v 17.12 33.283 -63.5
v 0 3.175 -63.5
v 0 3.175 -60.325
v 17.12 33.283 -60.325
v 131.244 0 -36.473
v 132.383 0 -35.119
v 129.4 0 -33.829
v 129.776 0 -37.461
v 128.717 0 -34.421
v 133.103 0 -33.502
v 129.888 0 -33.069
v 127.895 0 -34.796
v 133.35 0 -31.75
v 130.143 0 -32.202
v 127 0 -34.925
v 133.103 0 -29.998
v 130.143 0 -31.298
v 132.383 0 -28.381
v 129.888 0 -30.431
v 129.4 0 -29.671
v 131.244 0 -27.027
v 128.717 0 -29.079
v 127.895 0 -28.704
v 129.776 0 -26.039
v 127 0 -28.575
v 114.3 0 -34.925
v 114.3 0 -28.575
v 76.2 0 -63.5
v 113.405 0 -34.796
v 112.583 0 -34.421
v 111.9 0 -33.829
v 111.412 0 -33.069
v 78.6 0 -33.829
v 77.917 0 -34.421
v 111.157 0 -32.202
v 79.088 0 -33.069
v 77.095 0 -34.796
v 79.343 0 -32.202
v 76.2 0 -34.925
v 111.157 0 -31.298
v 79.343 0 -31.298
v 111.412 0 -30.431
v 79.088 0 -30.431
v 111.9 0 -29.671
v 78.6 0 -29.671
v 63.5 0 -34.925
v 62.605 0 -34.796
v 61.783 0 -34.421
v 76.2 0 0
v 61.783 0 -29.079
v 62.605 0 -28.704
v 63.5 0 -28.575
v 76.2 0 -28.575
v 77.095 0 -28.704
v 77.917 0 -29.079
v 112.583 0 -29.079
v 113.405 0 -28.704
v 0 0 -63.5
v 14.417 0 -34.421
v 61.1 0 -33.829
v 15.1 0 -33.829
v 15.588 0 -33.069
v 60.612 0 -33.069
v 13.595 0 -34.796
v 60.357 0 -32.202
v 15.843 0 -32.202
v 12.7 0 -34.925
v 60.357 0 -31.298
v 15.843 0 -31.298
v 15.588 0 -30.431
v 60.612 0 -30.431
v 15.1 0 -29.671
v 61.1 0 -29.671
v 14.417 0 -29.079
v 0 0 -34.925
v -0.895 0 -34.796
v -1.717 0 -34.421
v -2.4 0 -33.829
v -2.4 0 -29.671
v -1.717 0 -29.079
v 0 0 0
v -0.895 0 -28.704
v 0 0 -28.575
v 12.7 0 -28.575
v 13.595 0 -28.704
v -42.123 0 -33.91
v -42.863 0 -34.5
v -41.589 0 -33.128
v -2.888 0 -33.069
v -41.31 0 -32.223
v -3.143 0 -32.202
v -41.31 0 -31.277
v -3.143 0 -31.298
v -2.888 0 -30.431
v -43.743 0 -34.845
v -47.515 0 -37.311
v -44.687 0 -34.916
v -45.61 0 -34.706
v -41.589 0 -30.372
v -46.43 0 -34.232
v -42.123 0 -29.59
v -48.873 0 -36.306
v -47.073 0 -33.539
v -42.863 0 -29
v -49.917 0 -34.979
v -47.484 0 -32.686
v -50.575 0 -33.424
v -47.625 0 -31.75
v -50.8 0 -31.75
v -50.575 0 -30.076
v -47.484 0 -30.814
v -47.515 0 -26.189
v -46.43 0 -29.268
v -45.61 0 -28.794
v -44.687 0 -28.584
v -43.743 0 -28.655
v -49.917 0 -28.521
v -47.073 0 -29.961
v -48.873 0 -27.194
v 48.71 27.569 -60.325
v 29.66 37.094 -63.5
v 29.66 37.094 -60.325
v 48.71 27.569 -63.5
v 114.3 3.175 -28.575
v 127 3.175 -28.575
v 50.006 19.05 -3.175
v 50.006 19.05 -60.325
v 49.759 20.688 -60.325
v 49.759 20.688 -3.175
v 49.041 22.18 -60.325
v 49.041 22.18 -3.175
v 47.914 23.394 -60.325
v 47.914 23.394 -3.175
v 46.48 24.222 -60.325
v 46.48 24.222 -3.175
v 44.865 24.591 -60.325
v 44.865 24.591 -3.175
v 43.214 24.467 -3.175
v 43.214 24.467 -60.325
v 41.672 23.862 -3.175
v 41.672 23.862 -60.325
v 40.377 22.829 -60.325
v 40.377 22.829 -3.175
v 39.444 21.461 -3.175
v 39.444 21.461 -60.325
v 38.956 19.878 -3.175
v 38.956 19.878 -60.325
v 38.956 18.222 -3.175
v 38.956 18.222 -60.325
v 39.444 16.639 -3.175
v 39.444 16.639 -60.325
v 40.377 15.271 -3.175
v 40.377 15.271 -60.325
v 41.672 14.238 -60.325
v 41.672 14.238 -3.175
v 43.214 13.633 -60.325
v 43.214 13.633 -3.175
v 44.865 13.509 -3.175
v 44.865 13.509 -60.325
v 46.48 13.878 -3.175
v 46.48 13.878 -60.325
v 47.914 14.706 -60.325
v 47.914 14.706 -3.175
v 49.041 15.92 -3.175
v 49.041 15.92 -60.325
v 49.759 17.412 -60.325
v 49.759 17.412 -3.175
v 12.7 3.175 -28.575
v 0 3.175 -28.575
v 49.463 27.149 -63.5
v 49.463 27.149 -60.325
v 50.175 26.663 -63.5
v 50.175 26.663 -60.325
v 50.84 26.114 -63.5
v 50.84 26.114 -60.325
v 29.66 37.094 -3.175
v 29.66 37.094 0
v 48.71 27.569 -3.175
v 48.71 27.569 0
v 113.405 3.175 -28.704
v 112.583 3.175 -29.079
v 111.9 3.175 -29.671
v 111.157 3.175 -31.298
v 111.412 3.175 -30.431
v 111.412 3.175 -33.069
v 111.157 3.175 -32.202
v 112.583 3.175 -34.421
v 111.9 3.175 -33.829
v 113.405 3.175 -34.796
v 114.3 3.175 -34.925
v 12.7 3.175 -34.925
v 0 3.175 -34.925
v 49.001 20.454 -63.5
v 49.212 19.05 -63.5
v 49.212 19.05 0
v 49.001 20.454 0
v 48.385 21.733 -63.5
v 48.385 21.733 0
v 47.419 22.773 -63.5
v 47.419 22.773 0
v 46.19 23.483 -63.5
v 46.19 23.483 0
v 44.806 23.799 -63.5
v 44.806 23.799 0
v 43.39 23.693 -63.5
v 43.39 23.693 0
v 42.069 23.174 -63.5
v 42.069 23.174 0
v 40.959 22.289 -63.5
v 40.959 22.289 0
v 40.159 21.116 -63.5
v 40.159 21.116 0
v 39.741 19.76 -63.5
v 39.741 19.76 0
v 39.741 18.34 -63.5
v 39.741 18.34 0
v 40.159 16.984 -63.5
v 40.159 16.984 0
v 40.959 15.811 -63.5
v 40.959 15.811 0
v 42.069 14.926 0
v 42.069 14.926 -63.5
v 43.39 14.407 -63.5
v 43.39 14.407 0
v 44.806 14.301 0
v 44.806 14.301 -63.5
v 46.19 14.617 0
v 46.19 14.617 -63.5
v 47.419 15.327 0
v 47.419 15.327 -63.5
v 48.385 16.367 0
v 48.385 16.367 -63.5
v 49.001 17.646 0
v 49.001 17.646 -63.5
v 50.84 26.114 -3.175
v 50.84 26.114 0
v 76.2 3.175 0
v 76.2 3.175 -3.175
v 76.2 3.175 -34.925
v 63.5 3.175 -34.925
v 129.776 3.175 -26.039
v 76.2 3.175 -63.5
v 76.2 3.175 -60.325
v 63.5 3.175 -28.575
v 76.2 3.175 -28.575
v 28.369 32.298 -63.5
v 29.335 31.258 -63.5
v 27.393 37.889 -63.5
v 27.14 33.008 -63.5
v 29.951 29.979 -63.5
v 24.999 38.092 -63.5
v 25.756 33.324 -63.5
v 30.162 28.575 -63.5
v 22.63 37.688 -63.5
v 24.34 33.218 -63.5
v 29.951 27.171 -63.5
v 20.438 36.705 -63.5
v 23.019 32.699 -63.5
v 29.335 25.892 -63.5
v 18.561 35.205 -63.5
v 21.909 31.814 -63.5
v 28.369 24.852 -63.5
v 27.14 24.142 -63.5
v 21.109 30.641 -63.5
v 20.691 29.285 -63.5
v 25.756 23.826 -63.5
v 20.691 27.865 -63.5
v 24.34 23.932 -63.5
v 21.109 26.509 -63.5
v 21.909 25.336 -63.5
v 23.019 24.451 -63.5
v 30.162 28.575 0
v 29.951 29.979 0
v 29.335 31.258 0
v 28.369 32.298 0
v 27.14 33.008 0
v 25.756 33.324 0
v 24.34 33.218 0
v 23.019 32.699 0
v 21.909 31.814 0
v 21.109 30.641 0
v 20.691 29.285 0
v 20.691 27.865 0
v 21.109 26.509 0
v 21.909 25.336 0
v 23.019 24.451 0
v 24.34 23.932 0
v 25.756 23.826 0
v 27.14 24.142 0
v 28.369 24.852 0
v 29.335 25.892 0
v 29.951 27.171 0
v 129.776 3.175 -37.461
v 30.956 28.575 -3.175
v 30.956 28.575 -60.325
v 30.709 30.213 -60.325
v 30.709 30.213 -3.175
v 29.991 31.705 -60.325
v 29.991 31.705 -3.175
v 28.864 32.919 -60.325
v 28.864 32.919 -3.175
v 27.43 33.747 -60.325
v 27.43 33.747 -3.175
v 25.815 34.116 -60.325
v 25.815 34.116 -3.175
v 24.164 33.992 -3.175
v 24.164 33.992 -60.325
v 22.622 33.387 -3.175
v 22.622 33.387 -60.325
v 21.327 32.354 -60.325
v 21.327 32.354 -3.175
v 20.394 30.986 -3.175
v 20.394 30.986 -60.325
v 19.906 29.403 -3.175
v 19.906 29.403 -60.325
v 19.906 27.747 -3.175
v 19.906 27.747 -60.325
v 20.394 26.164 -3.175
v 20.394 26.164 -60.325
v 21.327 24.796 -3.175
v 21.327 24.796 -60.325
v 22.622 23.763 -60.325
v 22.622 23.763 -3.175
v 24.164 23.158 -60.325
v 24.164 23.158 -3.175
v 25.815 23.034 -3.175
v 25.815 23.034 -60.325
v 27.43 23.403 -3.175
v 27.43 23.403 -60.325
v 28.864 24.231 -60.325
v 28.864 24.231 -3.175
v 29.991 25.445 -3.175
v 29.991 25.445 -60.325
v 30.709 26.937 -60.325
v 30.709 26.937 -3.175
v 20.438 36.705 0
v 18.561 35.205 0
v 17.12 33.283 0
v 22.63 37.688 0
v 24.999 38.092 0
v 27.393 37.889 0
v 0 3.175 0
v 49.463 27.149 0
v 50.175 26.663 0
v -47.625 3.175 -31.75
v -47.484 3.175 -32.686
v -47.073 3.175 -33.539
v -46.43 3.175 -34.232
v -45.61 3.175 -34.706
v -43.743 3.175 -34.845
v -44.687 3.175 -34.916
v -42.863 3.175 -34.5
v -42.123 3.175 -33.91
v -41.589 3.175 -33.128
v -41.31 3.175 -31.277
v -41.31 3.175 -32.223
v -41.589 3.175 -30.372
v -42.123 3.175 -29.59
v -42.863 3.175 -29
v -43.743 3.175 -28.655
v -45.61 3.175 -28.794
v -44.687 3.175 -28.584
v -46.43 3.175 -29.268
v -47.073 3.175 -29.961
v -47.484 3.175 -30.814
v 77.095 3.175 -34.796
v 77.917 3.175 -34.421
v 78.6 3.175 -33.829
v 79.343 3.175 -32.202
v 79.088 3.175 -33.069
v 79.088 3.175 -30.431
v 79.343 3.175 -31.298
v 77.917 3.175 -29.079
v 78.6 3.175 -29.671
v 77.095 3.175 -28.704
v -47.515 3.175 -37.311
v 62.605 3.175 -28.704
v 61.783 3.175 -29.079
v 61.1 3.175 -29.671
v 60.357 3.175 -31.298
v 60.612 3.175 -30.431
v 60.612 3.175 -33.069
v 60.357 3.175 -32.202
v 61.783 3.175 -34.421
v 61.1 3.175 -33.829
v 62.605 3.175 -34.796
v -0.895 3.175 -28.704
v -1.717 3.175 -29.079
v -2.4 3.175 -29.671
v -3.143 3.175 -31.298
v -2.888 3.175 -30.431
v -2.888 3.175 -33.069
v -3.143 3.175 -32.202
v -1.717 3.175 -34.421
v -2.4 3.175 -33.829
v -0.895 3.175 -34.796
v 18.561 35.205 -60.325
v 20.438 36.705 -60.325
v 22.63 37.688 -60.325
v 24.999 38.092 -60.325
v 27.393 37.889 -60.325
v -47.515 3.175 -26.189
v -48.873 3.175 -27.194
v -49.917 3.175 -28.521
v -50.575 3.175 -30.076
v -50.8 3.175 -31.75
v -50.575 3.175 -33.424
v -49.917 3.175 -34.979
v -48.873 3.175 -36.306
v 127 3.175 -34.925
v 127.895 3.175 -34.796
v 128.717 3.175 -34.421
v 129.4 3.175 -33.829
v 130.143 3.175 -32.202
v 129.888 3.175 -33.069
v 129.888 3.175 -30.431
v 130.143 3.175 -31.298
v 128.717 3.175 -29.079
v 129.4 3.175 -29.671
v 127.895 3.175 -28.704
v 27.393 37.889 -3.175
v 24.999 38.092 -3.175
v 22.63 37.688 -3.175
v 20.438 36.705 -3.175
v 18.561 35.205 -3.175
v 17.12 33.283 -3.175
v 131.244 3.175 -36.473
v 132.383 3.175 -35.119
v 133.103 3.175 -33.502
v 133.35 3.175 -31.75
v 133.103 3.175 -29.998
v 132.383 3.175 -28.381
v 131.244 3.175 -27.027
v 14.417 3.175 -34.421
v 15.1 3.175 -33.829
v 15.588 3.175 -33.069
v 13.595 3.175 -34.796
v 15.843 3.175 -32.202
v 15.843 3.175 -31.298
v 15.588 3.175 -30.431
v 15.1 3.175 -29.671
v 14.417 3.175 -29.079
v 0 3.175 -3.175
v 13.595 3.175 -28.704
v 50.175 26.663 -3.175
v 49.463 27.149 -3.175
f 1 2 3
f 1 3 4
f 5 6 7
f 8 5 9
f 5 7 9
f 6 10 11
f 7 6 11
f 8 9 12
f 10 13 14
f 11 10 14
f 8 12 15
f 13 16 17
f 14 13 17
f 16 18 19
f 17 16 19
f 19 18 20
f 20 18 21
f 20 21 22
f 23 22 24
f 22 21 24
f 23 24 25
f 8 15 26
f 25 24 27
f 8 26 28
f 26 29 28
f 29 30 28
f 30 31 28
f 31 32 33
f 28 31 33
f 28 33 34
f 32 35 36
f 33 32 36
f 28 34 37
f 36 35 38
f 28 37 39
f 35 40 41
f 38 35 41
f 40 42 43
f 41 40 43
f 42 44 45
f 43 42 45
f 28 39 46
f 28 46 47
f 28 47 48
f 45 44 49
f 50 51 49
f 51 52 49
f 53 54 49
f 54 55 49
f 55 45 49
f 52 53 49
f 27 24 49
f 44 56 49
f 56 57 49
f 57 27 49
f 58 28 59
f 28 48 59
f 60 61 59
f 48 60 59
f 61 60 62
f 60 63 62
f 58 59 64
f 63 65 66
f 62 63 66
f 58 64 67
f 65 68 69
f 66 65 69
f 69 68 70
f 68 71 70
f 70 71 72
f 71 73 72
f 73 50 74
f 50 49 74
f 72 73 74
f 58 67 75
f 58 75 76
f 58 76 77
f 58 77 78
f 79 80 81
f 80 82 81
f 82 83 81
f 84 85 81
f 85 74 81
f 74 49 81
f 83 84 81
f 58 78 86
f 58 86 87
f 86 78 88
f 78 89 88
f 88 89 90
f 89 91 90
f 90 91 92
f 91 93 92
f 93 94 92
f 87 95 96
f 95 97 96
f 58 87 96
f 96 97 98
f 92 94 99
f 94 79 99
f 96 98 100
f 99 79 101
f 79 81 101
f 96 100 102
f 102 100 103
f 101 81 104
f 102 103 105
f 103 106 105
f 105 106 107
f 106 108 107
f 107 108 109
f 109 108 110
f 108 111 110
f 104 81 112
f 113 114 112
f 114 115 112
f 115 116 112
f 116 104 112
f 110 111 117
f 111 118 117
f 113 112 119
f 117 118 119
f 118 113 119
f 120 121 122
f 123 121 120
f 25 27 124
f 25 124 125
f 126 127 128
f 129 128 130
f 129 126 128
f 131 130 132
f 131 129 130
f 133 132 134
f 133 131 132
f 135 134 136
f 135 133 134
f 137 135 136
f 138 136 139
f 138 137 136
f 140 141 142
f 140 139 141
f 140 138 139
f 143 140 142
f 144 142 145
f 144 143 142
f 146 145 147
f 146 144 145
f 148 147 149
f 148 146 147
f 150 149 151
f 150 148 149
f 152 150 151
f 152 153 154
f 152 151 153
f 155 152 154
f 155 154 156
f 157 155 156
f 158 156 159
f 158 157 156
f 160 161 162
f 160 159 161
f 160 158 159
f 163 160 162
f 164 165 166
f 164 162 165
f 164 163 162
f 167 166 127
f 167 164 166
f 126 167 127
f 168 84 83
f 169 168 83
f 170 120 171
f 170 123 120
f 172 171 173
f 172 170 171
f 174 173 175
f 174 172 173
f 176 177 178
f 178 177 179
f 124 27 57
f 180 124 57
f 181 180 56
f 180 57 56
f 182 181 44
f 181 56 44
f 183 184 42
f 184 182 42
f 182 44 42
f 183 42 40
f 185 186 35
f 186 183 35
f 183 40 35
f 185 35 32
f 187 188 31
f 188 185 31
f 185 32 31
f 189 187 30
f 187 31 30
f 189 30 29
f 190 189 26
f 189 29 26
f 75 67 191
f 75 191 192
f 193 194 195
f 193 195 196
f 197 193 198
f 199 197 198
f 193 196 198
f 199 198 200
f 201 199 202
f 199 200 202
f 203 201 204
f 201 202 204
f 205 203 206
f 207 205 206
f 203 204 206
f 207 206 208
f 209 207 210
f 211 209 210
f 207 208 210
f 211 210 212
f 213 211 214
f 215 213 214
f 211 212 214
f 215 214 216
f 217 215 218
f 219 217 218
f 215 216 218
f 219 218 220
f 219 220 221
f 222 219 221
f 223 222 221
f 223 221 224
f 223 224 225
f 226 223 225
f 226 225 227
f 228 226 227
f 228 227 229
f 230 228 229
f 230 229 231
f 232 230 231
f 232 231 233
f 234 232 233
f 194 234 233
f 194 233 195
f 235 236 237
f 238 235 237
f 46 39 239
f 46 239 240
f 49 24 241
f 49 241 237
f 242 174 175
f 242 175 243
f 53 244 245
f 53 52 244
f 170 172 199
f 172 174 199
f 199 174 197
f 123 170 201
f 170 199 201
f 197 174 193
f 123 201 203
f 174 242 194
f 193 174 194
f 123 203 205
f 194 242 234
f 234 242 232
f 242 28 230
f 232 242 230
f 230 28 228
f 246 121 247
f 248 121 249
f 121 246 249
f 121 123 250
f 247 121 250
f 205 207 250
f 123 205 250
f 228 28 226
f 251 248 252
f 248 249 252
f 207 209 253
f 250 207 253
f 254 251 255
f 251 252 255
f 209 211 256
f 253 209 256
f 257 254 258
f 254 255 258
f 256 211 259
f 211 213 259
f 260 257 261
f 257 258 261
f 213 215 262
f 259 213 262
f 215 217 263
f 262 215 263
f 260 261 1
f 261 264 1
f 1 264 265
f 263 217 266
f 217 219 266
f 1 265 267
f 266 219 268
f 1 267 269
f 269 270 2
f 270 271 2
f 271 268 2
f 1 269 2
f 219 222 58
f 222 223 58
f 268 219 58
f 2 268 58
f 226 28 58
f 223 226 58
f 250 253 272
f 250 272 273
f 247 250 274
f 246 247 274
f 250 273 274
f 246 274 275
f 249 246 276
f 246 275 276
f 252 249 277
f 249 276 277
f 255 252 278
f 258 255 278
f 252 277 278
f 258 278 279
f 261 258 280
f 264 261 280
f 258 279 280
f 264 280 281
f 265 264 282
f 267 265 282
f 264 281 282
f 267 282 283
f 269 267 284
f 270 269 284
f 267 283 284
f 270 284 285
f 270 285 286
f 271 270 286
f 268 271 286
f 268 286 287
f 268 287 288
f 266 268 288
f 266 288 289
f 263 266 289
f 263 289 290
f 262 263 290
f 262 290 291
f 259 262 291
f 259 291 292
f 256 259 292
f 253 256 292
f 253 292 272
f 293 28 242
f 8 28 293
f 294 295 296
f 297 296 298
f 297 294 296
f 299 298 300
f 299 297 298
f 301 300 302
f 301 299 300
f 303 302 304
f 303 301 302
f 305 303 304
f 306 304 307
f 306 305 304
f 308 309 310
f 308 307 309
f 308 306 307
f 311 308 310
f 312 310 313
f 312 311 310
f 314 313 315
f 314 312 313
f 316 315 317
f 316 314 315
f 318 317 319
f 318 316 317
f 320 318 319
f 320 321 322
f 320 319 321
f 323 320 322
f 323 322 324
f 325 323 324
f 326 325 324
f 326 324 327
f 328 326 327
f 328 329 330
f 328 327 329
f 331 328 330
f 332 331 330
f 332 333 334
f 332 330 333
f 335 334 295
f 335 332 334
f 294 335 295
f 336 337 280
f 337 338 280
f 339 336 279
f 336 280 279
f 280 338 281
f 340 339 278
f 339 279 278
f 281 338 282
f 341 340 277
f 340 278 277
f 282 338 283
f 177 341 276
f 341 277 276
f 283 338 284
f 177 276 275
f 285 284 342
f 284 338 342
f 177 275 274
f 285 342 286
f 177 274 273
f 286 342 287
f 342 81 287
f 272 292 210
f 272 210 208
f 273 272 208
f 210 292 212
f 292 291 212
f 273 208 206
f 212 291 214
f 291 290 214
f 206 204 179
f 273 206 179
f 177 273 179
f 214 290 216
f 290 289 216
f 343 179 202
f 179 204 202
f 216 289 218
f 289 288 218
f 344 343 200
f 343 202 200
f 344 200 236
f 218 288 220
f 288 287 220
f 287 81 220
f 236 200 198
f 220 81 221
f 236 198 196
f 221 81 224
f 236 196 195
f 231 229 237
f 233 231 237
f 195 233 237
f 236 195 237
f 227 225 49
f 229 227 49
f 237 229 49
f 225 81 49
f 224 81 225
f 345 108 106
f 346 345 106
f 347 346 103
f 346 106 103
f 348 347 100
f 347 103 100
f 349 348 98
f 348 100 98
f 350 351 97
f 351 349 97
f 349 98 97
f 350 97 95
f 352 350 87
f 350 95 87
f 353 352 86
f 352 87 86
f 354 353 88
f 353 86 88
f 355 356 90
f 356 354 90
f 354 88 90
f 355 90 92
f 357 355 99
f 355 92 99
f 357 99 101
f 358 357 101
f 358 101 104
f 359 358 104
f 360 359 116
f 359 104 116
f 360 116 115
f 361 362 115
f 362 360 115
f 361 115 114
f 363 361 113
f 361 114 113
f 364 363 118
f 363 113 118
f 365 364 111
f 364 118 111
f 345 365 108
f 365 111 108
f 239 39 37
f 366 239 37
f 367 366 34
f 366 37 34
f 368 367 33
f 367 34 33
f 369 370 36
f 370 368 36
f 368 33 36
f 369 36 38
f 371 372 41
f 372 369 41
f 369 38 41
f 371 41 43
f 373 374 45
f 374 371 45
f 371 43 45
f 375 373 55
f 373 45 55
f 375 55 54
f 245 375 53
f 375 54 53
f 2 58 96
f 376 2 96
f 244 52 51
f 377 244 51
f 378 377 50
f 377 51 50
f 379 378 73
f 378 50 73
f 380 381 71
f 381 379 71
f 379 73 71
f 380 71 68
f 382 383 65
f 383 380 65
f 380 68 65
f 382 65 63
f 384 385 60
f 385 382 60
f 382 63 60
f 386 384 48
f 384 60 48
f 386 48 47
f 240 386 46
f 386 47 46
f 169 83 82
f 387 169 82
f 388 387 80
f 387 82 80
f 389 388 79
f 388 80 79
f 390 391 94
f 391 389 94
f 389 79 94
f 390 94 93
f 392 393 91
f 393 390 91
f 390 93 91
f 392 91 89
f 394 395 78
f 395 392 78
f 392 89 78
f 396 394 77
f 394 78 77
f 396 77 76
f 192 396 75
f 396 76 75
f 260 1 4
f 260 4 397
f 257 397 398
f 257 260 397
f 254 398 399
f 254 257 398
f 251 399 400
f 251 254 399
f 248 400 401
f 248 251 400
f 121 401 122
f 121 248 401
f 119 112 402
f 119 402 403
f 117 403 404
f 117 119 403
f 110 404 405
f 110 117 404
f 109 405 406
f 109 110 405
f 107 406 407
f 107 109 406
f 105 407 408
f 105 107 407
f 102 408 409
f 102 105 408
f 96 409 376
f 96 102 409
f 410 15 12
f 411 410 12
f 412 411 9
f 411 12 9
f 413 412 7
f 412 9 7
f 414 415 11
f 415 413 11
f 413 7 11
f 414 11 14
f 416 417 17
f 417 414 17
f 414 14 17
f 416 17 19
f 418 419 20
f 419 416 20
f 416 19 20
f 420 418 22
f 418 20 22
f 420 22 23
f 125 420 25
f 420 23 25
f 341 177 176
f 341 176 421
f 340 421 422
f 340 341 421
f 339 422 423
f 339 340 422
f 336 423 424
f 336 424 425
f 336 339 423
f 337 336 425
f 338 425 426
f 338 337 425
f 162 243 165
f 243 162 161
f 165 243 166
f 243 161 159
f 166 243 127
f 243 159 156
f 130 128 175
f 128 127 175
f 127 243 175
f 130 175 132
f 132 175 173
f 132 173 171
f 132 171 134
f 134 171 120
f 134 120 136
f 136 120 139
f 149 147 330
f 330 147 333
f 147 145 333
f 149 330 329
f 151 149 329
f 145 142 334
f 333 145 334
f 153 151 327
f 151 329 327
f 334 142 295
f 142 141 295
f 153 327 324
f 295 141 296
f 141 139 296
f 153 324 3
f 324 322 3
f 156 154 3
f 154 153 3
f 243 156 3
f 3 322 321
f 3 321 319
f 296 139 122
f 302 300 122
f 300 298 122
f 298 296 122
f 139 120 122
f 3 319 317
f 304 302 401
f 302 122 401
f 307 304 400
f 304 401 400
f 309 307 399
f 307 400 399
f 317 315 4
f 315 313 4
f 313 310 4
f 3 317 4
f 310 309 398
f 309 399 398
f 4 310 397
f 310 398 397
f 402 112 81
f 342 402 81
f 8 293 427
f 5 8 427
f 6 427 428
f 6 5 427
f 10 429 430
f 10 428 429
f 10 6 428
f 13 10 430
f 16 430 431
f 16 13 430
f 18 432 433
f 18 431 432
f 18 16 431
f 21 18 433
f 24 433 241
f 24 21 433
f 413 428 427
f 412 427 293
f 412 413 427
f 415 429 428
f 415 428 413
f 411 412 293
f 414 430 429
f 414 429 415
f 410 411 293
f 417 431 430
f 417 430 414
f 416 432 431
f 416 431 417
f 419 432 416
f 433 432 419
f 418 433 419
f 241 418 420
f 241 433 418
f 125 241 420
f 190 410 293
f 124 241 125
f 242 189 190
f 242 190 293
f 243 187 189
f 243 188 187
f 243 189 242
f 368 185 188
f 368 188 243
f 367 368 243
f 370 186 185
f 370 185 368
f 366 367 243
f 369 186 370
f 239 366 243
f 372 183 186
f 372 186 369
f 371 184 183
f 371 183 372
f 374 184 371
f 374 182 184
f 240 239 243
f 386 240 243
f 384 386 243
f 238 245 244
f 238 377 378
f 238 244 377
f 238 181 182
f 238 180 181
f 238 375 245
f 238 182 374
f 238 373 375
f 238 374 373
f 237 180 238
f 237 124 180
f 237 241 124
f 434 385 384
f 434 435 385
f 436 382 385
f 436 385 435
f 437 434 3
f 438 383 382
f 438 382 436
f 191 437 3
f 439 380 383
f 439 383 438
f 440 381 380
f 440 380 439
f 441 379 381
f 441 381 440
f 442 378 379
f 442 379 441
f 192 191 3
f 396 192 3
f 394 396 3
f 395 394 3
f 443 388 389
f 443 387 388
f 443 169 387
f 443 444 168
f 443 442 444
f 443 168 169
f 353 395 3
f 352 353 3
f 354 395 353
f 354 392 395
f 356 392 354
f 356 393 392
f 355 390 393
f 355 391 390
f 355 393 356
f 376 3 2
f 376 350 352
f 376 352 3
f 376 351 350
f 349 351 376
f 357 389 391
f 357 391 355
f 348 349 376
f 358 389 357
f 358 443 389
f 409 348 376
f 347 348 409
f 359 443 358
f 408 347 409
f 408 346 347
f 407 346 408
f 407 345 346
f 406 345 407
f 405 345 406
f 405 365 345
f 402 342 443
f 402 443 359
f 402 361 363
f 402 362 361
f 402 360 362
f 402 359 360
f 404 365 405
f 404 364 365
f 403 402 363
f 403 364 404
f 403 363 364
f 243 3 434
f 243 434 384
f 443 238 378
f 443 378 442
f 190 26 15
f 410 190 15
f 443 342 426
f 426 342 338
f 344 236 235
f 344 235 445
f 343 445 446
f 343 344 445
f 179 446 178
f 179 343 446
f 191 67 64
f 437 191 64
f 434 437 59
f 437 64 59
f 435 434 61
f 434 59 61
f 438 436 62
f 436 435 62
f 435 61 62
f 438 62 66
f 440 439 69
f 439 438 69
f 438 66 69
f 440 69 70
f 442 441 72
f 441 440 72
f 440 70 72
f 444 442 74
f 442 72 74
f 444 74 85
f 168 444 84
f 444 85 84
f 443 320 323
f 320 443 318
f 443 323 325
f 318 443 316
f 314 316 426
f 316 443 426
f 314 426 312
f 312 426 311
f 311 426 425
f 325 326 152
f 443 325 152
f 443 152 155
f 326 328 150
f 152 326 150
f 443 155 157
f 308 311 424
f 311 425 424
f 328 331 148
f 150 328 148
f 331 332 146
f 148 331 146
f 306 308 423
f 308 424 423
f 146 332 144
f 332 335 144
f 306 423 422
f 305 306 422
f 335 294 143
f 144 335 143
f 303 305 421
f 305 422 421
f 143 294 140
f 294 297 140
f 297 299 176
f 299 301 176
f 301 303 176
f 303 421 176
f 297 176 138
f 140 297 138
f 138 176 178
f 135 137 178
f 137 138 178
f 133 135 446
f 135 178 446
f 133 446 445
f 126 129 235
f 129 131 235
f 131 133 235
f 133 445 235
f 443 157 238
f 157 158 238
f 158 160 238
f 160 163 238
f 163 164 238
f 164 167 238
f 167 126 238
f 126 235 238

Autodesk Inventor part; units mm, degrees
ref_plane "YZ Plane" through (0, 0, 0) normal (1, 0, 0) x (0, 1, 0)
ref_plane "XZ Plane" through (0, 0, 0) normal (0, 1, 0) x (-1, 0, 0)
ref_plane "XY Plane" through (0, 0, 0) normal (0, 0, 1) x (1, 0, 0)
sketch "Sketch1" plane through (0, 0, 0) normal (0, 1, 0) x (-1, 0, 0)
  line L0 (0, 0) -> (-76.2, 0)
  line L1 (-76.2, 0) -> (-76.2, -63.5) construction
  line L2 (-76.2, -63.5) -> (0, -63.5)
  line L3 (0, -63.5) -> (0, 0) construction
  line L4 (0, -31.75) -> (44.45, -31.75) construction
  line L5 (-76.2, -31.75) -> (-127, -31.75) construction
  circle A0 centre (44.45, -31.75) radius 3.175
  circle A1 centre (-127, -31.75) radius 3.175 construction
  circle A2 centre (-114.3, -31.75) radius 3.175 construction
  line L6 (-114.3, -34.925) -> (-127, -34.925)
  line L7 (-114.3, -28.575) -> (-127, -28.575)
  arc A3 (-114.3, -34.925) -> (-114.3, -28.575) centre (-114.3, -31.75) ccw
  arc A4 (-127, -28.575) -> (-127, -34.925) centre (-127, -31.75) ccw
  line L8 (0, -63.5) -> (47.5152, -37.3112)
  line L9 (47.5152, -26.1888) -> (0, 0)
  line L10 (-76.2, -63.5) -> (-129.7757, -37.4612)
  line L11 (-129.7757, -26.0388) -> (-76.2, 0)
  arc A5 (47.5152, -37.3112) -> (47.5152, -26.1888) centre (44.45, -31.75) ccw
  arc A6 (-129.7757, -26.0388) -> (-129.7757, -37.4612) centre (-127, -31.75) ccw
  circle A7 centre (-76.2, -31.75) radius 3.175 construction
  circle A8 centre (-63.5, -31.75) radius 3.175 construction
  line L12 (-76.2, -28.575) -> (-63.5, -28.575) construction
  line L13 (-76.2, -34.925) -> (-63.5, -34.925) construction
  line L14 (-63.5, -28.575) -> (-76.2, -28.575)
  line L15 (-76.2, -34.925) -> (-63.5, -34.925)
  arc A9 (-63.5, -34.925) -> (-63.5, -28.575) centre (-63.5, -31.75) ccw
  arc A10 (-76.2, -28.575) -> (-76.2, -34.925) centre (-76.2, -31.75) ccw
  circle A11 centre (0, -31.75) radius 3.175 construction
  circle A12 centre (-12.7, -31.75) radius 3.175 construction
  line L16 (0, -28.575) -> (-12.7, -28.575) construction
  line L17 (0, -34.925) -> (-12.7, -34.925) construction
  arc A13 (-12.7, -28.575) -> (-12.7, -34.925) centre (-12.7, -31.75) ccw
  arc A14 (0, -34.925) -> (0, -28.575) centre (0, -31.75) ccw
  line L18 (-12.7, -34.925) -> (0, -34.925)
  line L19 (-12.7, -28.575) -> (0, -28.575)
  dimension "d0" = 76.2
  dimension "d1" = 63.5
  dimension "d2" = 44.45
  dimension "d3" = 50.8
  dimension "d4" = 6.35
  dimension "d5" = 6.35
  dimension "d6" = 6.35
  dimension "d7" = 12.7
  dimension "d8" = 6.35
  dimension "d9" = 0
  dimension "d10" = 0
  dimension "d11" = 0
  dimension "d12" = 0
  dimension "d13" = 6.35
  dimension "d14" = 6.35
  dimension "d15" = 12.7
  dimension "d16" = 0
  dimension "d17" = 6.35
  dimension "d18" = 6.35
  dimension "d19" = 0
  dimension "d20" = 12.7
extrude "Extrusion1" add sketch "Sketch1" along normal blind 3.175
sketch "Sketch2" plane through (0, 0, 0) normal (0, 0, 1) x (1, 0, 0)
  line L0 (0, 0) -> (76.2, 0) projected
  line L1 (76.2, 0) -> (76.2, 3.175) projected
  line L2 (0, 3.175) -> (76.2, 3.175) projected
  line L3 (0, 0) -> (0, 3.175) projected
  circle A0 centre (25.4, 28.575) radius 5.5562
  circle A1 centre (44.45, 19.05) radius 5.5563
  line L4 (0, 3.175) -> (17.12, 33.2832)
  line L5 (29.6597, 37.0944) -> (48.7097, 27.5694)
  line L6 (50.8395, 26.114) -> (76.2, 3.175)
  arc A2 (29.6597, 37.0944) -> (17.12, 33.2832) centre (25.4, 28.575) ccw
  arc A3 (50.8395, 26.114) -> (48.7097, 27.5694) centre (44.45, 19.05) ccw
  dimension "d23" = 11.1125
  dimension "d24" = 28.575
  dimension "d25" = 25.4
  dimension "d26" = 11.1125
  dimension "d27" = 19.05
  dimension "d28" = 31.75
  dimension "d29" = 9.525
extrude "Extrusion2" add sketch "Sketch2" against normal blind 3.175
sketch "Sketch3" plane through (76.2, 0, -63.5) normal (0, 0, -1) x (-1, 0, 0)
  line L0 (0, 0) -> (76.2, 0) projected
  line L1 (76.2, 0) -> (76.2, 3.175) projected
  line L2 (0, 3.175) -> (76.2, 3.175) projected
  line L3 (0, 0) -> (0, 3.175) projected
  line L4 (76.2, 3.175) -> (0, 3.175) projected
  line L5 (76.2, 3.175) -> (59.08, 33.2832) projected
  arc A0 (59.08, 33.2832) -> (46.5403, 37.0944) centre (50.8, 28.575) ccw projected
  line L6 (46.5403, 37.0944) -> (27.4903, 27.5694) projected
  arc A1 (27.4903, 27.5694) -> (25.3605, 26.114) centre (31.75, 19.05) ccw projected
  line L7 (25.3605, 26.114) -> (0, 3.175) projected
  circle A2 centre (31.75, 19.05) radius 5.5563 projected
  circle A3 centre (50.8, 28.575) radius 5.5562 projected
  point P0 (76.2, 0)
extrude "Extrusion3" add sketch "Sketch3" against normal blind 3.175
sketch "Sketch4" plane through (0, 0, 0) normal (0, 0, 1) x (1, 0, 0)
  circle A0 centre (44.45, 19.05) radius 5.5563 projected
  circle A1 centre (25.4, 28.575) radius 5.5562 projected
  line L0 (0, 0) -> (76.2, 0) projected
  line L1 (76.2, 0) -> (76.2, 3.175) projected
  line L2 (76.2, 3.175) -> (50.8395, 26.114) projected
  arc A2 (50.8395, 26.114) -> (48.7097, 27.5694) centre (44.45, 19.05) ccw projected
  line L3 (48.7097, 27.5694) -> (29.6597, 37.0944) projected
  arc A3 (29.6597, 37.0944) -> (17.12, 33.2832) centre (25.4, 28.575) ccw projected
  line L4 (17.12, 33.2832) -> (0, 3.175) projected
  line L5 (0, 0) -> (0, 3.175) projected
  circle A4 centre (25.4, 28.575) radius 4.7625
  circle A5 centre (44.45, 19.05) radius 4.7625
  dimension "d34" = 9.525
  dimension "d35" = 9.525
extrude "Extrusion4" add sketch "Sketch4" against normal blind 63.5 contours A0 | A1
properties part number "garage door hinge"
